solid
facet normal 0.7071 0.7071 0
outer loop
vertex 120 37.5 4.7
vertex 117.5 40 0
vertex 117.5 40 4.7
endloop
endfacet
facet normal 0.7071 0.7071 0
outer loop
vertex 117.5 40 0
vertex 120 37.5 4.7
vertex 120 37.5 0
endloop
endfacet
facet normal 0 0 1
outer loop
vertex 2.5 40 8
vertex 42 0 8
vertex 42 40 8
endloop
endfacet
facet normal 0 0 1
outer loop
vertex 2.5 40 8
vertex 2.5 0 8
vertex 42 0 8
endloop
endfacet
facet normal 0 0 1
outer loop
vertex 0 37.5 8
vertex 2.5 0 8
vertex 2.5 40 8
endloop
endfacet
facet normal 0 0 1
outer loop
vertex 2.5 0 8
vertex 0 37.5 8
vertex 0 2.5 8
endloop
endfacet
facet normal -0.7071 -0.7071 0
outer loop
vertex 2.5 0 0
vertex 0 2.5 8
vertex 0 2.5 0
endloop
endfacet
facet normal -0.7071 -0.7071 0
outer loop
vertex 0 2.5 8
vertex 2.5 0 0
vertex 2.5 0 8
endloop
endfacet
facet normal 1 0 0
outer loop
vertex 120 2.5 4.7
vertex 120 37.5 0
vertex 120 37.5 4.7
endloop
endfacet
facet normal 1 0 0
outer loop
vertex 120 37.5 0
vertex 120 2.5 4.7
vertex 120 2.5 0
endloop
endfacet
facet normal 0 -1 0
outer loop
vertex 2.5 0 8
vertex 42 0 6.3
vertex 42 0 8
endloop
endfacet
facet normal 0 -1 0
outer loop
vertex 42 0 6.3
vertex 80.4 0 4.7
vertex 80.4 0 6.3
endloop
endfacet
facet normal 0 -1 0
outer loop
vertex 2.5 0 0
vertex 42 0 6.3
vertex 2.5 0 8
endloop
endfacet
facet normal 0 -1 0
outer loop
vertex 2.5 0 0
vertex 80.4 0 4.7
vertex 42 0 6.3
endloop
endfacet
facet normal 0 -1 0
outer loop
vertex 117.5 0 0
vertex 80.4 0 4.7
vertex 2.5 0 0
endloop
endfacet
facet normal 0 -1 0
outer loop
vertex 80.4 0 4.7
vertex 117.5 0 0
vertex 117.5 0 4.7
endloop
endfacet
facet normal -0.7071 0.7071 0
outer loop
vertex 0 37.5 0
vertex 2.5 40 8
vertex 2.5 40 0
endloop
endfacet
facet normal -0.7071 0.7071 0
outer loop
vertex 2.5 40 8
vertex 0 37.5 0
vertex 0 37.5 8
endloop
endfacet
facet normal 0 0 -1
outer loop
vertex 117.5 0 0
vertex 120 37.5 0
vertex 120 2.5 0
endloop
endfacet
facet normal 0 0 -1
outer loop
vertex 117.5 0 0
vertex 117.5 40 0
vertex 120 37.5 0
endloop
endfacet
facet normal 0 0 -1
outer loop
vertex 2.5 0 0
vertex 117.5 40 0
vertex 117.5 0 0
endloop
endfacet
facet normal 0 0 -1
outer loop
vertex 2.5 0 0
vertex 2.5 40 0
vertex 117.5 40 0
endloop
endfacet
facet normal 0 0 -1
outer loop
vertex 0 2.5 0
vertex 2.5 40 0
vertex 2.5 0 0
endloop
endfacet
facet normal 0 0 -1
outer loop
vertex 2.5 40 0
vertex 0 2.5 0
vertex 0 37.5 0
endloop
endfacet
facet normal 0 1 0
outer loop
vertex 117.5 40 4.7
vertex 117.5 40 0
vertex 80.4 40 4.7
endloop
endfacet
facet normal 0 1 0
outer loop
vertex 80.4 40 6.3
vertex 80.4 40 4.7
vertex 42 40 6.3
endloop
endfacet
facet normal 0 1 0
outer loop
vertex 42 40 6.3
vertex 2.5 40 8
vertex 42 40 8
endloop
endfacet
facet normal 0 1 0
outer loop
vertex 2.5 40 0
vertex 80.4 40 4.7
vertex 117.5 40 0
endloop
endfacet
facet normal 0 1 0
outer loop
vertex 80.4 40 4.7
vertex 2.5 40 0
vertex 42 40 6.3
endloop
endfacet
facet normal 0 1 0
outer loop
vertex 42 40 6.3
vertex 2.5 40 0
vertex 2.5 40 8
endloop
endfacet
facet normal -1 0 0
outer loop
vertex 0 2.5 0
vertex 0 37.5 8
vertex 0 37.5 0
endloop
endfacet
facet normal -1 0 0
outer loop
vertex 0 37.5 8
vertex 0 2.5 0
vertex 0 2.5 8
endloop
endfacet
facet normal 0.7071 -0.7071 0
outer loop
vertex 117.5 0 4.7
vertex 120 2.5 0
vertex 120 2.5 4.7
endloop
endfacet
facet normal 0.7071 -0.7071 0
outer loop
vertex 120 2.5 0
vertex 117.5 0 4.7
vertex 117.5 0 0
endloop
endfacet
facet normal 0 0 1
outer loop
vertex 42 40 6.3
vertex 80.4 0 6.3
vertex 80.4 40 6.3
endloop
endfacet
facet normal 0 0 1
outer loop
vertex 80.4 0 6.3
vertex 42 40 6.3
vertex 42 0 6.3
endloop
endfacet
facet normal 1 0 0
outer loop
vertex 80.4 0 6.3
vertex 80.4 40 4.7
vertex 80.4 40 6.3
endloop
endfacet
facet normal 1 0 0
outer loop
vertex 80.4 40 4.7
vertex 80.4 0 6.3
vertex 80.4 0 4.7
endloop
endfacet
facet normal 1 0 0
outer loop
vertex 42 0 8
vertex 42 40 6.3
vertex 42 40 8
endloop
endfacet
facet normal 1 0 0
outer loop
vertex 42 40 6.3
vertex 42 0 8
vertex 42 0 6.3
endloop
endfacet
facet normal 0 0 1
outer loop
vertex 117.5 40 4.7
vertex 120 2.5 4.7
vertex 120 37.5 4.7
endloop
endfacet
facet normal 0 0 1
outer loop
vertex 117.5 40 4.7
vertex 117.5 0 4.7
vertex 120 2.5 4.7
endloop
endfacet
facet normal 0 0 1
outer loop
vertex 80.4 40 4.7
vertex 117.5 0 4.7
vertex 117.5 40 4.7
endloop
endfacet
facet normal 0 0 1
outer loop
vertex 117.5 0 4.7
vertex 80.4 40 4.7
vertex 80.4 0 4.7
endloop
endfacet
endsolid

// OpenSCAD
$fn = 32;

// ----------------------------------------------------------------------
// Stepped bar: twostep, 120 x 40 x 8/4.7 mm
// ----------------------------------------------------------------------

// --- parameters (mm) ---
bar_l = 120;              // bar length, X
bar_w = 40;               // bar width, Y
plate_t = 8;              // thickness of the thick zone, Z
thin_t = 4.7;             // thickness of the thin zone
corner_c = 2.5;           // corner chamfer of the bar
step_cut = 3.3;           // material removed from the thin zone
stair1_x = 42;            // position of the first stair
stair2_x = 80.4;          // position of the second stair
mid_t = 6.3;              // thickness of the middle zone
depth_1 = 1.7;            // depth of cut 1 from the top face
depth_2 = 3.3;            // depth of cut 2 from the top face

profile = [[2.5, 0], [117.5, 0], [120, 2.5], [120, 37.5], [117.5, 40], [2.5, 40], [0, 37.5], [0, 2.5]];  // primary outline, 8 points, counter clockwise
void_1 = [[42, -1], [80.4, -1], [80.4, 41], [42, 41]];  // first stair, 4 points
void_2 = [[80.4, -1], [121, -1], [121, 41], [80.4, 41]];  // second stair, 4 points

// --- the one profile operation ---
difference() {
  linear_extrude(height = plate_t) polygon(points = profile);
  translate([0, 0, plate_t - depth_1])
    linear_extrude(height = depth_1 + 1) polygon(points = void_1);
  translate([0, 0, plate_t - depth_2])
    linear_extrude(height = depth_2 + 1) polygon(points = void_2);
}
